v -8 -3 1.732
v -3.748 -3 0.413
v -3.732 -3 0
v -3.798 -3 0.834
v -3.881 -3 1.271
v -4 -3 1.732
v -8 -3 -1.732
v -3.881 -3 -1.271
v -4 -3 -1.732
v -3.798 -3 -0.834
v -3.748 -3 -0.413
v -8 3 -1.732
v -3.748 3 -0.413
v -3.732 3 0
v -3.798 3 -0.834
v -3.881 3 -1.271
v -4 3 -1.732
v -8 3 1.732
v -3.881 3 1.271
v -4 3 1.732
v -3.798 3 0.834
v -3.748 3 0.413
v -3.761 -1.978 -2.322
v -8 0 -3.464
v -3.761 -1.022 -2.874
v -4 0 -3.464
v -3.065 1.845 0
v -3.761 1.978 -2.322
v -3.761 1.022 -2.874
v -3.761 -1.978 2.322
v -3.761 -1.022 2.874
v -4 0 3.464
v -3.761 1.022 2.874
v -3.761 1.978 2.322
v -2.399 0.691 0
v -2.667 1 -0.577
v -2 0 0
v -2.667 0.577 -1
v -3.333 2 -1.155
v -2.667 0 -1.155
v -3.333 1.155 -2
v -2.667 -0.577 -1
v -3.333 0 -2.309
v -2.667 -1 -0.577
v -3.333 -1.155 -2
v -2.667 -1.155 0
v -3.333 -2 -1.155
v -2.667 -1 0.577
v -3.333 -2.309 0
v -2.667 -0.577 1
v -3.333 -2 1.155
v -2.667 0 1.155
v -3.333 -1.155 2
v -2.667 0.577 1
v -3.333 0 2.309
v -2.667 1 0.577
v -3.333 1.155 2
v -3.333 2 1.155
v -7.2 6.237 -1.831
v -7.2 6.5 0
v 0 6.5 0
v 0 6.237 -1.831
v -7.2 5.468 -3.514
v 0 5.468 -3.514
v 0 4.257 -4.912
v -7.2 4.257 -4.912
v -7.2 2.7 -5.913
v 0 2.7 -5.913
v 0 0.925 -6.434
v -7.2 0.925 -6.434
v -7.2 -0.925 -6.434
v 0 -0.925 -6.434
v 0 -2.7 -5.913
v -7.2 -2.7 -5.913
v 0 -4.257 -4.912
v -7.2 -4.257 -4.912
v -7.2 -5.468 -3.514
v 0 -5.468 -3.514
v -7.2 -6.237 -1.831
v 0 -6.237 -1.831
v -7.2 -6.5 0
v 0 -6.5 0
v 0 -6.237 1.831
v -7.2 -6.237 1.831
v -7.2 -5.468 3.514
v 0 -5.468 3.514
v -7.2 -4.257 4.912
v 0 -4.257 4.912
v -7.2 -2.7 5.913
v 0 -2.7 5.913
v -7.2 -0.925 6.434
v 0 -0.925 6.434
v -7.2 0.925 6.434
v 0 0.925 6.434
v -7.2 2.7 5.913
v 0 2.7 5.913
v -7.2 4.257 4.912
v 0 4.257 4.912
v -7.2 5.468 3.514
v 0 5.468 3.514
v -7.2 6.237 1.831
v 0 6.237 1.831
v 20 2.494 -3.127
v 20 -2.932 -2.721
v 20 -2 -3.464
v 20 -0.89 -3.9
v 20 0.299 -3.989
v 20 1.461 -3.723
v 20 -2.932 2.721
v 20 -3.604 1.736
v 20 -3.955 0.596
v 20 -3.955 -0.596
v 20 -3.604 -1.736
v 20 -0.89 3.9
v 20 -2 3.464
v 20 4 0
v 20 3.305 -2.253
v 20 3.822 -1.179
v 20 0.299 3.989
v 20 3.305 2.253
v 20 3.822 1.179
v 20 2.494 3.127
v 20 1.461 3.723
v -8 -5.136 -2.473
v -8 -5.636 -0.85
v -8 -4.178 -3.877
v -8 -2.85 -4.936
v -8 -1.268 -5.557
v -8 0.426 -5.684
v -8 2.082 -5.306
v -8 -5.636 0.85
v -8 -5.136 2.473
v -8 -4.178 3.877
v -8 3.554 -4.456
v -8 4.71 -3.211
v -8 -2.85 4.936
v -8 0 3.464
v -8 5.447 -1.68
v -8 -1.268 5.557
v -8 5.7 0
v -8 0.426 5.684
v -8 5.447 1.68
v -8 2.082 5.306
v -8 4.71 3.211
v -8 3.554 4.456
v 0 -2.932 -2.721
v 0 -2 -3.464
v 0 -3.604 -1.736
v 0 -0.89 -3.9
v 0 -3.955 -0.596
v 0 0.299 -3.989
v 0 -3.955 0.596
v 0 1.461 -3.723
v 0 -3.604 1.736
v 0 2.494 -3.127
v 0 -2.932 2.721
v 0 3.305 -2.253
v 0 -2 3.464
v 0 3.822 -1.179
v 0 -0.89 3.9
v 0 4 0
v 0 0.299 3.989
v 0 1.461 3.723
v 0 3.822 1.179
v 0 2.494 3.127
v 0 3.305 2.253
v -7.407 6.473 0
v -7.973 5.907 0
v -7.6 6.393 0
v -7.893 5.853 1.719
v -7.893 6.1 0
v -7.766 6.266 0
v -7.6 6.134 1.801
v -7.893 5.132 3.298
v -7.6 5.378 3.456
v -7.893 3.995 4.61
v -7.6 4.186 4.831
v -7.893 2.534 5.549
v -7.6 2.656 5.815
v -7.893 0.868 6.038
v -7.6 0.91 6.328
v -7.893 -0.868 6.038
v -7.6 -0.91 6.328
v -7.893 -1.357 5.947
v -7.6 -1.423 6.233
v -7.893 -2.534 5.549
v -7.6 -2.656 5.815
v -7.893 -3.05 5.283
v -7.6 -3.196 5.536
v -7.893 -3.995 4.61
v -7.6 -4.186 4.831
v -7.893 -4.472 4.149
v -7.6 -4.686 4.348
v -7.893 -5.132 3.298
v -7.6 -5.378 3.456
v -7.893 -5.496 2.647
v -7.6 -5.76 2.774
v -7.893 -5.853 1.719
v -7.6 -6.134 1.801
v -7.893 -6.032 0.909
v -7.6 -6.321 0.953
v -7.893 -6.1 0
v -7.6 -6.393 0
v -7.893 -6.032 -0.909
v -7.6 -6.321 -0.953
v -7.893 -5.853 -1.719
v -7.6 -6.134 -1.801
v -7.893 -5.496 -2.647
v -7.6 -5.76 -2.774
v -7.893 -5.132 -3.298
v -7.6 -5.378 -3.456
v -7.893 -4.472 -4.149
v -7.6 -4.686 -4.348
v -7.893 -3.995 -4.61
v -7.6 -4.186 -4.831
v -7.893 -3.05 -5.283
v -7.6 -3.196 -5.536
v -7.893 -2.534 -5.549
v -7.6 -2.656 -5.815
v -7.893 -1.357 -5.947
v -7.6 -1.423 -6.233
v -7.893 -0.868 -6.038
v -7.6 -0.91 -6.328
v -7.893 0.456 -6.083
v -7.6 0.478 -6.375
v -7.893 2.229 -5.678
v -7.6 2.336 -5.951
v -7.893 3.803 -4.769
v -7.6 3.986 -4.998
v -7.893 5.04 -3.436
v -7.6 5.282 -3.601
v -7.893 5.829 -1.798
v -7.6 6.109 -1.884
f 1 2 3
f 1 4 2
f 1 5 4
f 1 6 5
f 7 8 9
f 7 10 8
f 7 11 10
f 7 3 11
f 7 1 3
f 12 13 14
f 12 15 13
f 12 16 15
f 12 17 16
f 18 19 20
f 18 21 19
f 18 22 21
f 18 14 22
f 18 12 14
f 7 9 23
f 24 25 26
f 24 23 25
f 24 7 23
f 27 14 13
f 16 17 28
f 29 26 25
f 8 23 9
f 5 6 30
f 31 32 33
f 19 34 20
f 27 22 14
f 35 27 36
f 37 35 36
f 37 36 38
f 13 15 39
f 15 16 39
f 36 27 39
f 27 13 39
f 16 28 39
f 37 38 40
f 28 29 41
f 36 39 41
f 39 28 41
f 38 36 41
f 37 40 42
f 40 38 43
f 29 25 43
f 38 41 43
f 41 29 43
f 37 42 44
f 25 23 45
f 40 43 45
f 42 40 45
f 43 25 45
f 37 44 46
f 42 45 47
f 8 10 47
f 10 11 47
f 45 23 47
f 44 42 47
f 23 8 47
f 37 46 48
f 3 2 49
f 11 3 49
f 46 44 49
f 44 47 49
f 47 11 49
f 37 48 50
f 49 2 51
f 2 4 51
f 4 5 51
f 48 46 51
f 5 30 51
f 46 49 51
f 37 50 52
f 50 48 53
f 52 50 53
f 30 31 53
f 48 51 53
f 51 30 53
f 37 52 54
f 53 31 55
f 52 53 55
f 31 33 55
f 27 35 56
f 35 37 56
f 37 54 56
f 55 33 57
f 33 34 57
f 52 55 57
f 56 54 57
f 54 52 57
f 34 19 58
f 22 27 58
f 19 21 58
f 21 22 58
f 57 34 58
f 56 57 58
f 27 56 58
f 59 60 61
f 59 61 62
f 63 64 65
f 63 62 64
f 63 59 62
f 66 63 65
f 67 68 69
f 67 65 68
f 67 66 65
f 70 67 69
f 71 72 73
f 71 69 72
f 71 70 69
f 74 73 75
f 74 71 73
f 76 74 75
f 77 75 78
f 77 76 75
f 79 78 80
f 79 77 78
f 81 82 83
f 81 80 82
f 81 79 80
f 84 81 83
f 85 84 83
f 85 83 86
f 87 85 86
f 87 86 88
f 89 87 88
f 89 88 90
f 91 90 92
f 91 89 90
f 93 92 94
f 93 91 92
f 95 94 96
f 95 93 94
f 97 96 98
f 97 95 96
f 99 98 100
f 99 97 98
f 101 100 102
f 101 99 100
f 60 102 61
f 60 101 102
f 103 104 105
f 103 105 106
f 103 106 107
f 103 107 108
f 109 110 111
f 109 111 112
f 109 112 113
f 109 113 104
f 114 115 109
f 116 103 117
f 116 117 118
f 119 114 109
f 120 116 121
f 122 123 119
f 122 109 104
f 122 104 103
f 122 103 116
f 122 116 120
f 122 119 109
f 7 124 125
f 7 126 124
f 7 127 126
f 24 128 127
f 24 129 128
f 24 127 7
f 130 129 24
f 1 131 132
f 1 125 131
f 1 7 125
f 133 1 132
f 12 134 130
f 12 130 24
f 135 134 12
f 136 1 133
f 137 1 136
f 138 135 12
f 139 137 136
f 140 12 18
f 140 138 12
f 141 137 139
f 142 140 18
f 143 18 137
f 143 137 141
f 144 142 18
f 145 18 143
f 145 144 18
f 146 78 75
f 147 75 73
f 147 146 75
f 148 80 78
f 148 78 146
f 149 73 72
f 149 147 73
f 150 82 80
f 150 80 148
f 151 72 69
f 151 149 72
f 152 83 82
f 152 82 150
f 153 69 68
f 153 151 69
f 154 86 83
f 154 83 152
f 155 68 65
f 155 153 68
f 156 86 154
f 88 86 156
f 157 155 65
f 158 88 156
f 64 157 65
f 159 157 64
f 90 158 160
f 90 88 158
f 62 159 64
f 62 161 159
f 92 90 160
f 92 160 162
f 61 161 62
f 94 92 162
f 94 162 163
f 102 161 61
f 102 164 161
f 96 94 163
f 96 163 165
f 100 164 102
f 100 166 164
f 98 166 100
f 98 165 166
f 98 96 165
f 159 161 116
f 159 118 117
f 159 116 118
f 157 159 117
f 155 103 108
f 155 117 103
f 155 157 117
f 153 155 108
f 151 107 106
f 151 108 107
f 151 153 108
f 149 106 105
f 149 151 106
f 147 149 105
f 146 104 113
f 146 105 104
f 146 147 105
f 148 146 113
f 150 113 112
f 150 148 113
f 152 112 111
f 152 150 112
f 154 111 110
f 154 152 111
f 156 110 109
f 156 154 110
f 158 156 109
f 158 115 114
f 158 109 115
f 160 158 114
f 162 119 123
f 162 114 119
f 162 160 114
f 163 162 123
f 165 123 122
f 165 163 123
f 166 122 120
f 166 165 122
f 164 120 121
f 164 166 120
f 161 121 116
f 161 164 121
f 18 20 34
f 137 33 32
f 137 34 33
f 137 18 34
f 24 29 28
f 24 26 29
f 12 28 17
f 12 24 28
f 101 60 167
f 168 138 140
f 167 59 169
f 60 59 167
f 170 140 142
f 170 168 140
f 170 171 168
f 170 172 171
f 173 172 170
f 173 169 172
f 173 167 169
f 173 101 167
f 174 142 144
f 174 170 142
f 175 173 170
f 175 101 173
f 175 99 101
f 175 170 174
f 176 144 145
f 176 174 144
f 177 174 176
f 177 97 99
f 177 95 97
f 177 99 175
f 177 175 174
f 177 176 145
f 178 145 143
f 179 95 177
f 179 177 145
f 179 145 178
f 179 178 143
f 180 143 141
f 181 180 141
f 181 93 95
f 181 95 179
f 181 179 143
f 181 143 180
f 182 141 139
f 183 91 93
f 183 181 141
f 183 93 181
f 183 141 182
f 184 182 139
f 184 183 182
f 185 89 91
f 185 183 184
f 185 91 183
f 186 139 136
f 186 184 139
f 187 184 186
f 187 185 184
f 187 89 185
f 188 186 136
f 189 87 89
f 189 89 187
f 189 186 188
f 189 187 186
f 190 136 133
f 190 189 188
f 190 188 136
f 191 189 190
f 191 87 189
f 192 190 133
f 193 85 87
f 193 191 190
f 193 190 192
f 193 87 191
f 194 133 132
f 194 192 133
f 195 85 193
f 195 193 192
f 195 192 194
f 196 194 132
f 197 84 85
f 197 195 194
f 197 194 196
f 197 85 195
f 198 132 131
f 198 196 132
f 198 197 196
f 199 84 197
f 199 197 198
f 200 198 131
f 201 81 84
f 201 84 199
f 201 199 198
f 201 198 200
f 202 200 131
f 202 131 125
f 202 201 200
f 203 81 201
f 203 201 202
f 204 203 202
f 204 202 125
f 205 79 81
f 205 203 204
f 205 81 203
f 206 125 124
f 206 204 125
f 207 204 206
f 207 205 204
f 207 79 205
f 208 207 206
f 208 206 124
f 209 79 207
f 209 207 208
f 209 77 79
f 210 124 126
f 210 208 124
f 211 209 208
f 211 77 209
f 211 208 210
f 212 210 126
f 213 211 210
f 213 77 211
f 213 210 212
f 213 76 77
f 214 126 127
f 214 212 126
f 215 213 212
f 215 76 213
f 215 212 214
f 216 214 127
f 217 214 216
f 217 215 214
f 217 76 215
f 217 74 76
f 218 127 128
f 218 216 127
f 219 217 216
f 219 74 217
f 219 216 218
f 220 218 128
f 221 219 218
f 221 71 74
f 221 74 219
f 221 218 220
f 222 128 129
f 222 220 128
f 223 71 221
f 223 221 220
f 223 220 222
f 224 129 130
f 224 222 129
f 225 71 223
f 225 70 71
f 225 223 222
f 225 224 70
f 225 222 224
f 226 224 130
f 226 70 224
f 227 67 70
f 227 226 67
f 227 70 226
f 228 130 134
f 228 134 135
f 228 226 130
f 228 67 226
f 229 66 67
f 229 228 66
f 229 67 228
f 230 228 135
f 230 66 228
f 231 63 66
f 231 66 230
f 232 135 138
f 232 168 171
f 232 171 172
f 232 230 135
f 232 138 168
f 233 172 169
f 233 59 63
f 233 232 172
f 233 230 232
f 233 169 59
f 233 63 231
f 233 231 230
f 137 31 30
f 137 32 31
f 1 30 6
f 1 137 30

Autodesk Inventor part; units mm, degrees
ref_plane "YZ Plane" through (0, 0, 0) normal (1, 0, 0) x (0, 1, 0)
ref_plane "XZ Plane" through (0, 0, 0) normal (0, 1, 0) x (-1, 0, 0)
ref_plane "XY Plane" through (0, 0, 0) normal (0, 0, 1) x (1, 0, 0)
sketch "Sketch1" plane through (0, 0, 0) normal (0, 0, 1) x (1, 0, 0)
  line L0 (-2, 0) -> (20, 0)
  line L1 (20, 0) -> (20, 4)
  line L2 (20, 4) -> (3.125, 4)
  line L3 (3.125, 4) -> (2.3581, 4)
  line L4 (2.3581, 4) -> (0, 4)
  line L5 (0, 4) -> (0, 6.5)
  line L6 (0, 6.5) -> (-8, 6.5)
  line L7 (-8, 6.5) -> (-8, 3.4641)
  line L8 (-8, 3.4641) -> (-4, 3.4641)
  line L9 (-4, 3.4641) -> (-2, 0)
  line L10 (-13.6, 0) -> (25.6, 0) projected
  line L11 (0, -1.3) -> (0, 7.8) projected
  line L12 (3.125, 4) -> (0, 4) construction
  dimension "d1" = 16.875
  dimension "d2" = 0.7669
  dimension "d3" = 8
  dimension "d4" = 4
  dimension "d5" = 60
  dimension "d6" = 8
  dimension "d7" = 8
  dimension "d8" = 6.9282
  dimension "d9" = 13
  dimension "d26" = 20
revolve "Body" add sketch "Sketch1" angle 360 about axis through (-2, 0, 0) along (1, 0, 0)
sketch "Sketch2" plane through (-8, 0, 0) normal (-1, 0, 0) x (0, 0, 1)
  circle A0 centre (0, 0) radius 3.4641 projected
  line L0 (0, -9.1) -> (0, 9.1) projected
  line L1 (-9.1, 0) -> (9.1, 0) projected
  line L2 (3.4641, 0) -> (1.7321, -3)
  line L3 (1.7321, -3) -> (-1.7321, -3)
  line L4 (-1.7321, -3) -> (-3.4641, 0)
  line L5 (-3.4641, 0) -> (-1.7321, 3)
  line L6 (-1.7321, 3) -> (1.7321, 3)
  line L7 (1.7321, 3) -> (3.4641, 0)
extrude "Slot" add sketch "Sketch2" against normal up to next contours L7 A0 | A0 L2 | L6 L0 A0 | A0 L0 L3 | L0 L6 A0 | A0 L3 L0 | L4 A0 | A0 L5
fillet "Fillet1" radius 0.8 1 edges at (-8, -6.5, 0)
thread "Thread" size "M8x1.25" class "6g" standard "ISO Metric profile" length 16.875
equation "\"d1\" = GEL"
equation "\"d3\" = KOH"
equation "\"d4\" = INTI"
equation "\"d6\" = GD"
equation "\"d7\" = BDM"
equation "\"d8\" = 1.1547 * SW"
equation "\"d9\" = KOD"
equation "\"d26\" = NLG"
equation "\"d17\" = RR"
equation "\"d13\" = GEL"
equation "\"GD\" = 8"
equation "\"NLG\" = 20"
equation "\"GEL\" = 16.875"
equation "\"KOD\" = 13"
equation "\"KOH\" = 8"
equation "\"INTI\" = 4"
equation "\"GAL\" = 0.61345 * PTC"
equation "\"GUL\" = 0.61345 * PTC"
equation "\"BDM\" = NND"
equation "\"SW\" = 6"
equation "\"RR\" = 0.8"
equation "\"SPD\" = NND - 1.2269 * PTC"
equation "\"R\" = 0.1"
equation "\"TOA\" = 30deg"
equation "\"GD1\" = THREADDIA - 1.2269 * PTC"
equation "\"THREADDIA\" = 8"
equation "\"FAWI\" = 45deg"
equation "\"PTC\" = 1.25"
equation "\"NND\" = 8"
equation "\"E0\" = 1.155 * SW"
equation "\"d38\" = 55deg"
equation "\"Sketch4_Pitch\" = 1.25"
properties part number "ISO 4762 - M8 x 20" material "Stainless Steel, 440C"
